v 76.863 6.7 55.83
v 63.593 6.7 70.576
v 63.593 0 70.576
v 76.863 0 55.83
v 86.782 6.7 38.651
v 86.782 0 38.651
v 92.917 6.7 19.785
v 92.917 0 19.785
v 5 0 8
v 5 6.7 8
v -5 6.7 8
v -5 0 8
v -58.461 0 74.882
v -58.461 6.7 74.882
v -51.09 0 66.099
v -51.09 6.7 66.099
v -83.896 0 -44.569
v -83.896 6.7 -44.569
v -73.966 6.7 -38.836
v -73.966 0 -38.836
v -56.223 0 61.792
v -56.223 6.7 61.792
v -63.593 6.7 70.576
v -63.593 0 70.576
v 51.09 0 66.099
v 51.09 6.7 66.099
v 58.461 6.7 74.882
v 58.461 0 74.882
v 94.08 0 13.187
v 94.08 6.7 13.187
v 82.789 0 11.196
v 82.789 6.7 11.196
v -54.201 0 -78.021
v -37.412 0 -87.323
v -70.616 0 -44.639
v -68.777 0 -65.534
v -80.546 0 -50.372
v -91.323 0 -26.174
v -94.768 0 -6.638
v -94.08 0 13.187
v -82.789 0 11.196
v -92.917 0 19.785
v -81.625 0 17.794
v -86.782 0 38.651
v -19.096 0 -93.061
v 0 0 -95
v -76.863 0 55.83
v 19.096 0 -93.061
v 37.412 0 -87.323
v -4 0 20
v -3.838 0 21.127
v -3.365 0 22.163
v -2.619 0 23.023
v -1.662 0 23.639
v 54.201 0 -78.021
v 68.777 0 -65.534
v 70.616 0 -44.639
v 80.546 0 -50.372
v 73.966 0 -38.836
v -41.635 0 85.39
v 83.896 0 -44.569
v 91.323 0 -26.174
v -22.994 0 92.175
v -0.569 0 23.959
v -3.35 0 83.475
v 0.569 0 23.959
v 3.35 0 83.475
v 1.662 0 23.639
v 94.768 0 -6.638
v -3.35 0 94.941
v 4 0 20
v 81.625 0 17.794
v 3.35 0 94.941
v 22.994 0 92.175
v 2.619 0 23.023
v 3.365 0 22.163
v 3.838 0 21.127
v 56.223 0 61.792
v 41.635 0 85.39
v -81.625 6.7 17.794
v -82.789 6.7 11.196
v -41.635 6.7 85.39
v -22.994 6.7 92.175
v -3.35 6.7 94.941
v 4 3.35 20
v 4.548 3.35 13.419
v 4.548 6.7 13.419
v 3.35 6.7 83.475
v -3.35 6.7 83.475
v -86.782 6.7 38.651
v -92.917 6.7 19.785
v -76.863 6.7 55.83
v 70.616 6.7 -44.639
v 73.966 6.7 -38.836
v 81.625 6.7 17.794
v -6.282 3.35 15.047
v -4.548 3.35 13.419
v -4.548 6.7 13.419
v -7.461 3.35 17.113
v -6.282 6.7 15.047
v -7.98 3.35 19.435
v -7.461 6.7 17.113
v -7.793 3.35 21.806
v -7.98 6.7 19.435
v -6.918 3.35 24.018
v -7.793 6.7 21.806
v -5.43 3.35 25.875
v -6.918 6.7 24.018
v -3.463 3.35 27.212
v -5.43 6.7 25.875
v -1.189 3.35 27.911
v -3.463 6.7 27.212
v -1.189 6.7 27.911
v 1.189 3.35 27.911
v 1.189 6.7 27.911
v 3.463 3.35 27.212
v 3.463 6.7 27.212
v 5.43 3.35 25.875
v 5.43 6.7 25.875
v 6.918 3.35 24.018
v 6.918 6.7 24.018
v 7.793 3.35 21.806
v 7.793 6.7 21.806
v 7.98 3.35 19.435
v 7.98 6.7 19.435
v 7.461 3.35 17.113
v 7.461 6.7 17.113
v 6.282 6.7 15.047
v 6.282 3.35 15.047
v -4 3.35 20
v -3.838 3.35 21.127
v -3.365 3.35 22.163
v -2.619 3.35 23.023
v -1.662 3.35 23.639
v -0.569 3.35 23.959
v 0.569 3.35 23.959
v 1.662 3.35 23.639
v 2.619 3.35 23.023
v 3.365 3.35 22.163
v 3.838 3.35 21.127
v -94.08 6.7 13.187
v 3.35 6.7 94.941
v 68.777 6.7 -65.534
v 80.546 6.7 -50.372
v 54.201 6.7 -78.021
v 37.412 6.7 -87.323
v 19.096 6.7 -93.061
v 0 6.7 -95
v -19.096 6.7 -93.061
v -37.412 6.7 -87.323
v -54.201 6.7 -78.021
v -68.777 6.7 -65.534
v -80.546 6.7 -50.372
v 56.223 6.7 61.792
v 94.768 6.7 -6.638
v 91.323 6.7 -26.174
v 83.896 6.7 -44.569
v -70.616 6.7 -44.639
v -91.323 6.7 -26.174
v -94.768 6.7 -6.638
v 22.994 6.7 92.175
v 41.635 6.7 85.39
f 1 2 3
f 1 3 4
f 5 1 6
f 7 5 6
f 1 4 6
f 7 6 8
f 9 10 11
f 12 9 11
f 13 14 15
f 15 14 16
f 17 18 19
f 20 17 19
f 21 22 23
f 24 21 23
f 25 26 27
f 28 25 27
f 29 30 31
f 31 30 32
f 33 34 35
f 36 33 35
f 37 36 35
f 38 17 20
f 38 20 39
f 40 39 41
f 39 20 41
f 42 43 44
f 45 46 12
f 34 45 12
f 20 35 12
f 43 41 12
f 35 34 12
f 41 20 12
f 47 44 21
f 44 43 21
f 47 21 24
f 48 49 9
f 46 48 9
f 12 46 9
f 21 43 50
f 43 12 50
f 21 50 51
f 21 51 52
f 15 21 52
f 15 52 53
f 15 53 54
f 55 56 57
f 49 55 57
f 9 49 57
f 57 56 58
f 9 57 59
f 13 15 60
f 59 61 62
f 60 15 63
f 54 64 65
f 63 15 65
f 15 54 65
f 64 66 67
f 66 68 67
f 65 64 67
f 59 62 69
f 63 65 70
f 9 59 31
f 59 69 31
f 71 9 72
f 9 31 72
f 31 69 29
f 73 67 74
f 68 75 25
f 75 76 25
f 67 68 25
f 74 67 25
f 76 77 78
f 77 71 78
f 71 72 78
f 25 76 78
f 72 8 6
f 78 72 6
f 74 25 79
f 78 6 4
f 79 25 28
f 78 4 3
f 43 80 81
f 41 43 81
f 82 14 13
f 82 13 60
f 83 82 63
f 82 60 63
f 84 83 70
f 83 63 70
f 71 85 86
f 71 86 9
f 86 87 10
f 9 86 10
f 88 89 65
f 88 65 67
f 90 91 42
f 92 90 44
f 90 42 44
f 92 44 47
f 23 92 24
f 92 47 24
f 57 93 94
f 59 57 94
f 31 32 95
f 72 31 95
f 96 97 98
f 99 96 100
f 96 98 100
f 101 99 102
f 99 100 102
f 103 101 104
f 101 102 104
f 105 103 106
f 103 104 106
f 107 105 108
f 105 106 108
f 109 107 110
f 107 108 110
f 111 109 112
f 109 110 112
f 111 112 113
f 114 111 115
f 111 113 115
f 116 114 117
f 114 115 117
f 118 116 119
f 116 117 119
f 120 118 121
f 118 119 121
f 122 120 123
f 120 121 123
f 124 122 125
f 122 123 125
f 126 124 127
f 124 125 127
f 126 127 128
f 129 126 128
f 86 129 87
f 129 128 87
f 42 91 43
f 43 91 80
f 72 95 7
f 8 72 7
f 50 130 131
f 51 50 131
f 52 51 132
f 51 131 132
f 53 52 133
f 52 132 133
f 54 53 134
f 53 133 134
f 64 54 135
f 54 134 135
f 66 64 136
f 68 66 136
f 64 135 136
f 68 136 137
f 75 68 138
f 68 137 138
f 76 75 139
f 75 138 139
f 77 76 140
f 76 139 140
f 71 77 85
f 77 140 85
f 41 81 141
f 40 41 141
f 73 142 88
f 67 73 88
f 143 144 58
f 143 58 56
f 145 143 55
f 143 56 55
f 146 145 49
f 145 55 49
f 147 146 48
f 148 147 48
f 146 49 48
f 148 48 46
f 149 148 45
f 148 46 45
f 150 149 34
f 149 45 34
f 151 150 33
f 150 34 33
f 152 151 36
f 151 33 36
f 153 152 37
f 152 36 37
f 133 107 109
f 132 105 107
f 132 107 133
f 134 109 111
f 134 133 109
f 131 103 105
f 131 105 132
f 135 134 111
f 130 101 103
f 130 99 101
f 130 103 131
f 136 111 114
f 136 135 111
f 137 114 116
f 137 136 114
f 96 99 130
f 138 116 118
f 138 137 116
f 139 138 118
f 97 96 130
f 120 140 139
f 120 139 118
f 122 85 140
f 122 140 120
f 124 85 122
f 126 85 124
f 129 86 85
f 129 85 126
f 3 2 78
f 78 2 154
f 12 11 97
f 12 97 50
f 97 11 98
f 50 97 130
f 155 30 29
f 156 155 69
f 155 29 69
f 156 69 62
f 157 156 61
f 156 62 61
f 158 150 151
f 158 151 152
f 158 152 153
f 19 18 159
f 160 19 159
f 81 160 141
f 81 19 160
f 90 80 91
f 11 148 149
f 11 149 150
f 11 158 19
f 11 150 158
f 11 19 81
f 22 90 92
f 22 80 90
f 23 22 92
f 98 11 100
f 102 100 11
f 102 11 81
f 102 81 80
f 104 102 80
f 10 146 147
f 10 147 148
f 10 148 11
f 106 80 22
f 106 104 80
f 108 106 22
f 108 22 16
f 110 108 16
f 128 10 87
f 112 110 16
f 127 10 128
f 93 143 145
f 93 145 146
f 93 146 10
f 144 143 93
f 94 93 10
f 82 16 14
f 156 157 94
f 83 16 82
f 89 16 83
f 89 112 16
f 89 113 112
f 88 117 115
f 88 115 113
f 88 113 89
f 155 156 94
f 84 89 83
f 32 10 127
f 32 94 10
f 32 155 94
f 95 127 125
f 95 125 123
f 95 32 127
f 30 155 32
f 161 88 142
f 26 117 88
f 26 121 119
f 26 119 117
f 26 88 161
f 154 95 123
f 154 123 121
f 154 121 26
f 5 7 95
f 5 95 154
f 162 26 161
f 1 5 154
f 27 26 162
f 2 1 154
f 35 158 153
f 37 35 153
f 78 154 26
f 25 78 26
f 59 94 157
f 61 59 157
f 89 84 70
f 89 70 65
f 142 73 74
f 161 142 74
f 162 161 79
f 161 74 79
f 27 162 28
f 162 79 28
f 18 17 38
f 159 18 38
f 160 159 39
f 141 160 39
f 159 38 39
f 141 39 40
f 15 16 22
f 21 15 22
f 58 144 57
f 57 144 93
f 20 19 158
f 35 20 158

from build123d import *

# Parameters (mm, degrees)
SKETCH1_R           = 95
BOSS_EXTRUDE1_DEPTH = 6.7
SKETCH2_W           = 6.7
SKETCH2_H           = 20
CUT_EXTRUDE3_DEPTH  = 6.7
SKETCH3_R           = 8
CUT_EXTRUDE4_DEPTH  = 3.35


with BuildPart() as part:
    # Sketch1 → Boss-Extrude1 (new body)
    with BuildSketch(Plane(origin=(0, 0, 0), x_dir=(1, 0, 0), z_dir=(0, 1, 0))):
        with Locations(Location((0, 0, 0), (0, 0, 270))):
            Circle(SKETCH1_R)
    extrude(amount=BOSS_EXTRUDE1_DEPTH)

    # Sketch2 → Cut-Extrude3 (cut)
    with BuildSketch(Plane(origin=(0, 6.7, 0), x_dir=(1, 0, 0), z_dir=(0, 1, 0))):
        with BuildLine():
            Line((5, -8), (-5, -8))
            Line((-5, -8), (-4, -20))
            ThreePointArc((-4, -20), (0, -24), (4, -20))
            Line((4, -20), (5, -8))
        make_face()
        Polygon((87.936978657, 54.638685103), (70.616470581, 44.638685103), (73.966470581, 38.836314897), (91.286978657, 48.836314897), align=None)
        Polygon((69.078696797, -77.113110259), (56.222944603, -61.792221397), (51.090446834, -66.098898382), (63.946199028, -81.419787244), align=None)
        Polygon((102.484703638, -14.669139211), (82.788548578, -11.196175658), (81.625105788, -17.794387603), (101.321260848, -21.267351157), align=None)
        with Locations((0, -93.475)):
            Rectangle(SKETCH2_W, SKETCH2_H)
        Polygon((-63.946199028, -81.419787244), (-51.090446834, -66.098898382), (-56.222944603, -61.792221397), (-69.078696797, -77.113110259), align=None)
        Polygon((-101.321260848, -21.267351157), (-81.625105788, -17.794387603), (-82.788548578, -11.196175658), (-102.484703638, -14.669139211), align=None)
        Polygon((-91.286978657, 48.836314897), (-73.966470581, 38.836314897), (-70.616470581, 44.638685103), (-87.936978657, 54.638685103), align=None)
    extrude(amount=-CUT_EXTRUDE3_DEPTH, mode=Mode.SUBTRACT)

    # Sketch3 → Cut-Extrude4 (cut)
    with BuildSketch(Plane(origin=(0, 6.7, 0), x_dir=(1, 0, 0), z_dir=(0, 1, 0))):
        with Locations((0, -20)):
            Circle(SKETCH3_R)
    extrude(amount=-CUT_EXTRUDE4_DEPTH, mode=Mode.SUBTRACT)


solid = part.part
